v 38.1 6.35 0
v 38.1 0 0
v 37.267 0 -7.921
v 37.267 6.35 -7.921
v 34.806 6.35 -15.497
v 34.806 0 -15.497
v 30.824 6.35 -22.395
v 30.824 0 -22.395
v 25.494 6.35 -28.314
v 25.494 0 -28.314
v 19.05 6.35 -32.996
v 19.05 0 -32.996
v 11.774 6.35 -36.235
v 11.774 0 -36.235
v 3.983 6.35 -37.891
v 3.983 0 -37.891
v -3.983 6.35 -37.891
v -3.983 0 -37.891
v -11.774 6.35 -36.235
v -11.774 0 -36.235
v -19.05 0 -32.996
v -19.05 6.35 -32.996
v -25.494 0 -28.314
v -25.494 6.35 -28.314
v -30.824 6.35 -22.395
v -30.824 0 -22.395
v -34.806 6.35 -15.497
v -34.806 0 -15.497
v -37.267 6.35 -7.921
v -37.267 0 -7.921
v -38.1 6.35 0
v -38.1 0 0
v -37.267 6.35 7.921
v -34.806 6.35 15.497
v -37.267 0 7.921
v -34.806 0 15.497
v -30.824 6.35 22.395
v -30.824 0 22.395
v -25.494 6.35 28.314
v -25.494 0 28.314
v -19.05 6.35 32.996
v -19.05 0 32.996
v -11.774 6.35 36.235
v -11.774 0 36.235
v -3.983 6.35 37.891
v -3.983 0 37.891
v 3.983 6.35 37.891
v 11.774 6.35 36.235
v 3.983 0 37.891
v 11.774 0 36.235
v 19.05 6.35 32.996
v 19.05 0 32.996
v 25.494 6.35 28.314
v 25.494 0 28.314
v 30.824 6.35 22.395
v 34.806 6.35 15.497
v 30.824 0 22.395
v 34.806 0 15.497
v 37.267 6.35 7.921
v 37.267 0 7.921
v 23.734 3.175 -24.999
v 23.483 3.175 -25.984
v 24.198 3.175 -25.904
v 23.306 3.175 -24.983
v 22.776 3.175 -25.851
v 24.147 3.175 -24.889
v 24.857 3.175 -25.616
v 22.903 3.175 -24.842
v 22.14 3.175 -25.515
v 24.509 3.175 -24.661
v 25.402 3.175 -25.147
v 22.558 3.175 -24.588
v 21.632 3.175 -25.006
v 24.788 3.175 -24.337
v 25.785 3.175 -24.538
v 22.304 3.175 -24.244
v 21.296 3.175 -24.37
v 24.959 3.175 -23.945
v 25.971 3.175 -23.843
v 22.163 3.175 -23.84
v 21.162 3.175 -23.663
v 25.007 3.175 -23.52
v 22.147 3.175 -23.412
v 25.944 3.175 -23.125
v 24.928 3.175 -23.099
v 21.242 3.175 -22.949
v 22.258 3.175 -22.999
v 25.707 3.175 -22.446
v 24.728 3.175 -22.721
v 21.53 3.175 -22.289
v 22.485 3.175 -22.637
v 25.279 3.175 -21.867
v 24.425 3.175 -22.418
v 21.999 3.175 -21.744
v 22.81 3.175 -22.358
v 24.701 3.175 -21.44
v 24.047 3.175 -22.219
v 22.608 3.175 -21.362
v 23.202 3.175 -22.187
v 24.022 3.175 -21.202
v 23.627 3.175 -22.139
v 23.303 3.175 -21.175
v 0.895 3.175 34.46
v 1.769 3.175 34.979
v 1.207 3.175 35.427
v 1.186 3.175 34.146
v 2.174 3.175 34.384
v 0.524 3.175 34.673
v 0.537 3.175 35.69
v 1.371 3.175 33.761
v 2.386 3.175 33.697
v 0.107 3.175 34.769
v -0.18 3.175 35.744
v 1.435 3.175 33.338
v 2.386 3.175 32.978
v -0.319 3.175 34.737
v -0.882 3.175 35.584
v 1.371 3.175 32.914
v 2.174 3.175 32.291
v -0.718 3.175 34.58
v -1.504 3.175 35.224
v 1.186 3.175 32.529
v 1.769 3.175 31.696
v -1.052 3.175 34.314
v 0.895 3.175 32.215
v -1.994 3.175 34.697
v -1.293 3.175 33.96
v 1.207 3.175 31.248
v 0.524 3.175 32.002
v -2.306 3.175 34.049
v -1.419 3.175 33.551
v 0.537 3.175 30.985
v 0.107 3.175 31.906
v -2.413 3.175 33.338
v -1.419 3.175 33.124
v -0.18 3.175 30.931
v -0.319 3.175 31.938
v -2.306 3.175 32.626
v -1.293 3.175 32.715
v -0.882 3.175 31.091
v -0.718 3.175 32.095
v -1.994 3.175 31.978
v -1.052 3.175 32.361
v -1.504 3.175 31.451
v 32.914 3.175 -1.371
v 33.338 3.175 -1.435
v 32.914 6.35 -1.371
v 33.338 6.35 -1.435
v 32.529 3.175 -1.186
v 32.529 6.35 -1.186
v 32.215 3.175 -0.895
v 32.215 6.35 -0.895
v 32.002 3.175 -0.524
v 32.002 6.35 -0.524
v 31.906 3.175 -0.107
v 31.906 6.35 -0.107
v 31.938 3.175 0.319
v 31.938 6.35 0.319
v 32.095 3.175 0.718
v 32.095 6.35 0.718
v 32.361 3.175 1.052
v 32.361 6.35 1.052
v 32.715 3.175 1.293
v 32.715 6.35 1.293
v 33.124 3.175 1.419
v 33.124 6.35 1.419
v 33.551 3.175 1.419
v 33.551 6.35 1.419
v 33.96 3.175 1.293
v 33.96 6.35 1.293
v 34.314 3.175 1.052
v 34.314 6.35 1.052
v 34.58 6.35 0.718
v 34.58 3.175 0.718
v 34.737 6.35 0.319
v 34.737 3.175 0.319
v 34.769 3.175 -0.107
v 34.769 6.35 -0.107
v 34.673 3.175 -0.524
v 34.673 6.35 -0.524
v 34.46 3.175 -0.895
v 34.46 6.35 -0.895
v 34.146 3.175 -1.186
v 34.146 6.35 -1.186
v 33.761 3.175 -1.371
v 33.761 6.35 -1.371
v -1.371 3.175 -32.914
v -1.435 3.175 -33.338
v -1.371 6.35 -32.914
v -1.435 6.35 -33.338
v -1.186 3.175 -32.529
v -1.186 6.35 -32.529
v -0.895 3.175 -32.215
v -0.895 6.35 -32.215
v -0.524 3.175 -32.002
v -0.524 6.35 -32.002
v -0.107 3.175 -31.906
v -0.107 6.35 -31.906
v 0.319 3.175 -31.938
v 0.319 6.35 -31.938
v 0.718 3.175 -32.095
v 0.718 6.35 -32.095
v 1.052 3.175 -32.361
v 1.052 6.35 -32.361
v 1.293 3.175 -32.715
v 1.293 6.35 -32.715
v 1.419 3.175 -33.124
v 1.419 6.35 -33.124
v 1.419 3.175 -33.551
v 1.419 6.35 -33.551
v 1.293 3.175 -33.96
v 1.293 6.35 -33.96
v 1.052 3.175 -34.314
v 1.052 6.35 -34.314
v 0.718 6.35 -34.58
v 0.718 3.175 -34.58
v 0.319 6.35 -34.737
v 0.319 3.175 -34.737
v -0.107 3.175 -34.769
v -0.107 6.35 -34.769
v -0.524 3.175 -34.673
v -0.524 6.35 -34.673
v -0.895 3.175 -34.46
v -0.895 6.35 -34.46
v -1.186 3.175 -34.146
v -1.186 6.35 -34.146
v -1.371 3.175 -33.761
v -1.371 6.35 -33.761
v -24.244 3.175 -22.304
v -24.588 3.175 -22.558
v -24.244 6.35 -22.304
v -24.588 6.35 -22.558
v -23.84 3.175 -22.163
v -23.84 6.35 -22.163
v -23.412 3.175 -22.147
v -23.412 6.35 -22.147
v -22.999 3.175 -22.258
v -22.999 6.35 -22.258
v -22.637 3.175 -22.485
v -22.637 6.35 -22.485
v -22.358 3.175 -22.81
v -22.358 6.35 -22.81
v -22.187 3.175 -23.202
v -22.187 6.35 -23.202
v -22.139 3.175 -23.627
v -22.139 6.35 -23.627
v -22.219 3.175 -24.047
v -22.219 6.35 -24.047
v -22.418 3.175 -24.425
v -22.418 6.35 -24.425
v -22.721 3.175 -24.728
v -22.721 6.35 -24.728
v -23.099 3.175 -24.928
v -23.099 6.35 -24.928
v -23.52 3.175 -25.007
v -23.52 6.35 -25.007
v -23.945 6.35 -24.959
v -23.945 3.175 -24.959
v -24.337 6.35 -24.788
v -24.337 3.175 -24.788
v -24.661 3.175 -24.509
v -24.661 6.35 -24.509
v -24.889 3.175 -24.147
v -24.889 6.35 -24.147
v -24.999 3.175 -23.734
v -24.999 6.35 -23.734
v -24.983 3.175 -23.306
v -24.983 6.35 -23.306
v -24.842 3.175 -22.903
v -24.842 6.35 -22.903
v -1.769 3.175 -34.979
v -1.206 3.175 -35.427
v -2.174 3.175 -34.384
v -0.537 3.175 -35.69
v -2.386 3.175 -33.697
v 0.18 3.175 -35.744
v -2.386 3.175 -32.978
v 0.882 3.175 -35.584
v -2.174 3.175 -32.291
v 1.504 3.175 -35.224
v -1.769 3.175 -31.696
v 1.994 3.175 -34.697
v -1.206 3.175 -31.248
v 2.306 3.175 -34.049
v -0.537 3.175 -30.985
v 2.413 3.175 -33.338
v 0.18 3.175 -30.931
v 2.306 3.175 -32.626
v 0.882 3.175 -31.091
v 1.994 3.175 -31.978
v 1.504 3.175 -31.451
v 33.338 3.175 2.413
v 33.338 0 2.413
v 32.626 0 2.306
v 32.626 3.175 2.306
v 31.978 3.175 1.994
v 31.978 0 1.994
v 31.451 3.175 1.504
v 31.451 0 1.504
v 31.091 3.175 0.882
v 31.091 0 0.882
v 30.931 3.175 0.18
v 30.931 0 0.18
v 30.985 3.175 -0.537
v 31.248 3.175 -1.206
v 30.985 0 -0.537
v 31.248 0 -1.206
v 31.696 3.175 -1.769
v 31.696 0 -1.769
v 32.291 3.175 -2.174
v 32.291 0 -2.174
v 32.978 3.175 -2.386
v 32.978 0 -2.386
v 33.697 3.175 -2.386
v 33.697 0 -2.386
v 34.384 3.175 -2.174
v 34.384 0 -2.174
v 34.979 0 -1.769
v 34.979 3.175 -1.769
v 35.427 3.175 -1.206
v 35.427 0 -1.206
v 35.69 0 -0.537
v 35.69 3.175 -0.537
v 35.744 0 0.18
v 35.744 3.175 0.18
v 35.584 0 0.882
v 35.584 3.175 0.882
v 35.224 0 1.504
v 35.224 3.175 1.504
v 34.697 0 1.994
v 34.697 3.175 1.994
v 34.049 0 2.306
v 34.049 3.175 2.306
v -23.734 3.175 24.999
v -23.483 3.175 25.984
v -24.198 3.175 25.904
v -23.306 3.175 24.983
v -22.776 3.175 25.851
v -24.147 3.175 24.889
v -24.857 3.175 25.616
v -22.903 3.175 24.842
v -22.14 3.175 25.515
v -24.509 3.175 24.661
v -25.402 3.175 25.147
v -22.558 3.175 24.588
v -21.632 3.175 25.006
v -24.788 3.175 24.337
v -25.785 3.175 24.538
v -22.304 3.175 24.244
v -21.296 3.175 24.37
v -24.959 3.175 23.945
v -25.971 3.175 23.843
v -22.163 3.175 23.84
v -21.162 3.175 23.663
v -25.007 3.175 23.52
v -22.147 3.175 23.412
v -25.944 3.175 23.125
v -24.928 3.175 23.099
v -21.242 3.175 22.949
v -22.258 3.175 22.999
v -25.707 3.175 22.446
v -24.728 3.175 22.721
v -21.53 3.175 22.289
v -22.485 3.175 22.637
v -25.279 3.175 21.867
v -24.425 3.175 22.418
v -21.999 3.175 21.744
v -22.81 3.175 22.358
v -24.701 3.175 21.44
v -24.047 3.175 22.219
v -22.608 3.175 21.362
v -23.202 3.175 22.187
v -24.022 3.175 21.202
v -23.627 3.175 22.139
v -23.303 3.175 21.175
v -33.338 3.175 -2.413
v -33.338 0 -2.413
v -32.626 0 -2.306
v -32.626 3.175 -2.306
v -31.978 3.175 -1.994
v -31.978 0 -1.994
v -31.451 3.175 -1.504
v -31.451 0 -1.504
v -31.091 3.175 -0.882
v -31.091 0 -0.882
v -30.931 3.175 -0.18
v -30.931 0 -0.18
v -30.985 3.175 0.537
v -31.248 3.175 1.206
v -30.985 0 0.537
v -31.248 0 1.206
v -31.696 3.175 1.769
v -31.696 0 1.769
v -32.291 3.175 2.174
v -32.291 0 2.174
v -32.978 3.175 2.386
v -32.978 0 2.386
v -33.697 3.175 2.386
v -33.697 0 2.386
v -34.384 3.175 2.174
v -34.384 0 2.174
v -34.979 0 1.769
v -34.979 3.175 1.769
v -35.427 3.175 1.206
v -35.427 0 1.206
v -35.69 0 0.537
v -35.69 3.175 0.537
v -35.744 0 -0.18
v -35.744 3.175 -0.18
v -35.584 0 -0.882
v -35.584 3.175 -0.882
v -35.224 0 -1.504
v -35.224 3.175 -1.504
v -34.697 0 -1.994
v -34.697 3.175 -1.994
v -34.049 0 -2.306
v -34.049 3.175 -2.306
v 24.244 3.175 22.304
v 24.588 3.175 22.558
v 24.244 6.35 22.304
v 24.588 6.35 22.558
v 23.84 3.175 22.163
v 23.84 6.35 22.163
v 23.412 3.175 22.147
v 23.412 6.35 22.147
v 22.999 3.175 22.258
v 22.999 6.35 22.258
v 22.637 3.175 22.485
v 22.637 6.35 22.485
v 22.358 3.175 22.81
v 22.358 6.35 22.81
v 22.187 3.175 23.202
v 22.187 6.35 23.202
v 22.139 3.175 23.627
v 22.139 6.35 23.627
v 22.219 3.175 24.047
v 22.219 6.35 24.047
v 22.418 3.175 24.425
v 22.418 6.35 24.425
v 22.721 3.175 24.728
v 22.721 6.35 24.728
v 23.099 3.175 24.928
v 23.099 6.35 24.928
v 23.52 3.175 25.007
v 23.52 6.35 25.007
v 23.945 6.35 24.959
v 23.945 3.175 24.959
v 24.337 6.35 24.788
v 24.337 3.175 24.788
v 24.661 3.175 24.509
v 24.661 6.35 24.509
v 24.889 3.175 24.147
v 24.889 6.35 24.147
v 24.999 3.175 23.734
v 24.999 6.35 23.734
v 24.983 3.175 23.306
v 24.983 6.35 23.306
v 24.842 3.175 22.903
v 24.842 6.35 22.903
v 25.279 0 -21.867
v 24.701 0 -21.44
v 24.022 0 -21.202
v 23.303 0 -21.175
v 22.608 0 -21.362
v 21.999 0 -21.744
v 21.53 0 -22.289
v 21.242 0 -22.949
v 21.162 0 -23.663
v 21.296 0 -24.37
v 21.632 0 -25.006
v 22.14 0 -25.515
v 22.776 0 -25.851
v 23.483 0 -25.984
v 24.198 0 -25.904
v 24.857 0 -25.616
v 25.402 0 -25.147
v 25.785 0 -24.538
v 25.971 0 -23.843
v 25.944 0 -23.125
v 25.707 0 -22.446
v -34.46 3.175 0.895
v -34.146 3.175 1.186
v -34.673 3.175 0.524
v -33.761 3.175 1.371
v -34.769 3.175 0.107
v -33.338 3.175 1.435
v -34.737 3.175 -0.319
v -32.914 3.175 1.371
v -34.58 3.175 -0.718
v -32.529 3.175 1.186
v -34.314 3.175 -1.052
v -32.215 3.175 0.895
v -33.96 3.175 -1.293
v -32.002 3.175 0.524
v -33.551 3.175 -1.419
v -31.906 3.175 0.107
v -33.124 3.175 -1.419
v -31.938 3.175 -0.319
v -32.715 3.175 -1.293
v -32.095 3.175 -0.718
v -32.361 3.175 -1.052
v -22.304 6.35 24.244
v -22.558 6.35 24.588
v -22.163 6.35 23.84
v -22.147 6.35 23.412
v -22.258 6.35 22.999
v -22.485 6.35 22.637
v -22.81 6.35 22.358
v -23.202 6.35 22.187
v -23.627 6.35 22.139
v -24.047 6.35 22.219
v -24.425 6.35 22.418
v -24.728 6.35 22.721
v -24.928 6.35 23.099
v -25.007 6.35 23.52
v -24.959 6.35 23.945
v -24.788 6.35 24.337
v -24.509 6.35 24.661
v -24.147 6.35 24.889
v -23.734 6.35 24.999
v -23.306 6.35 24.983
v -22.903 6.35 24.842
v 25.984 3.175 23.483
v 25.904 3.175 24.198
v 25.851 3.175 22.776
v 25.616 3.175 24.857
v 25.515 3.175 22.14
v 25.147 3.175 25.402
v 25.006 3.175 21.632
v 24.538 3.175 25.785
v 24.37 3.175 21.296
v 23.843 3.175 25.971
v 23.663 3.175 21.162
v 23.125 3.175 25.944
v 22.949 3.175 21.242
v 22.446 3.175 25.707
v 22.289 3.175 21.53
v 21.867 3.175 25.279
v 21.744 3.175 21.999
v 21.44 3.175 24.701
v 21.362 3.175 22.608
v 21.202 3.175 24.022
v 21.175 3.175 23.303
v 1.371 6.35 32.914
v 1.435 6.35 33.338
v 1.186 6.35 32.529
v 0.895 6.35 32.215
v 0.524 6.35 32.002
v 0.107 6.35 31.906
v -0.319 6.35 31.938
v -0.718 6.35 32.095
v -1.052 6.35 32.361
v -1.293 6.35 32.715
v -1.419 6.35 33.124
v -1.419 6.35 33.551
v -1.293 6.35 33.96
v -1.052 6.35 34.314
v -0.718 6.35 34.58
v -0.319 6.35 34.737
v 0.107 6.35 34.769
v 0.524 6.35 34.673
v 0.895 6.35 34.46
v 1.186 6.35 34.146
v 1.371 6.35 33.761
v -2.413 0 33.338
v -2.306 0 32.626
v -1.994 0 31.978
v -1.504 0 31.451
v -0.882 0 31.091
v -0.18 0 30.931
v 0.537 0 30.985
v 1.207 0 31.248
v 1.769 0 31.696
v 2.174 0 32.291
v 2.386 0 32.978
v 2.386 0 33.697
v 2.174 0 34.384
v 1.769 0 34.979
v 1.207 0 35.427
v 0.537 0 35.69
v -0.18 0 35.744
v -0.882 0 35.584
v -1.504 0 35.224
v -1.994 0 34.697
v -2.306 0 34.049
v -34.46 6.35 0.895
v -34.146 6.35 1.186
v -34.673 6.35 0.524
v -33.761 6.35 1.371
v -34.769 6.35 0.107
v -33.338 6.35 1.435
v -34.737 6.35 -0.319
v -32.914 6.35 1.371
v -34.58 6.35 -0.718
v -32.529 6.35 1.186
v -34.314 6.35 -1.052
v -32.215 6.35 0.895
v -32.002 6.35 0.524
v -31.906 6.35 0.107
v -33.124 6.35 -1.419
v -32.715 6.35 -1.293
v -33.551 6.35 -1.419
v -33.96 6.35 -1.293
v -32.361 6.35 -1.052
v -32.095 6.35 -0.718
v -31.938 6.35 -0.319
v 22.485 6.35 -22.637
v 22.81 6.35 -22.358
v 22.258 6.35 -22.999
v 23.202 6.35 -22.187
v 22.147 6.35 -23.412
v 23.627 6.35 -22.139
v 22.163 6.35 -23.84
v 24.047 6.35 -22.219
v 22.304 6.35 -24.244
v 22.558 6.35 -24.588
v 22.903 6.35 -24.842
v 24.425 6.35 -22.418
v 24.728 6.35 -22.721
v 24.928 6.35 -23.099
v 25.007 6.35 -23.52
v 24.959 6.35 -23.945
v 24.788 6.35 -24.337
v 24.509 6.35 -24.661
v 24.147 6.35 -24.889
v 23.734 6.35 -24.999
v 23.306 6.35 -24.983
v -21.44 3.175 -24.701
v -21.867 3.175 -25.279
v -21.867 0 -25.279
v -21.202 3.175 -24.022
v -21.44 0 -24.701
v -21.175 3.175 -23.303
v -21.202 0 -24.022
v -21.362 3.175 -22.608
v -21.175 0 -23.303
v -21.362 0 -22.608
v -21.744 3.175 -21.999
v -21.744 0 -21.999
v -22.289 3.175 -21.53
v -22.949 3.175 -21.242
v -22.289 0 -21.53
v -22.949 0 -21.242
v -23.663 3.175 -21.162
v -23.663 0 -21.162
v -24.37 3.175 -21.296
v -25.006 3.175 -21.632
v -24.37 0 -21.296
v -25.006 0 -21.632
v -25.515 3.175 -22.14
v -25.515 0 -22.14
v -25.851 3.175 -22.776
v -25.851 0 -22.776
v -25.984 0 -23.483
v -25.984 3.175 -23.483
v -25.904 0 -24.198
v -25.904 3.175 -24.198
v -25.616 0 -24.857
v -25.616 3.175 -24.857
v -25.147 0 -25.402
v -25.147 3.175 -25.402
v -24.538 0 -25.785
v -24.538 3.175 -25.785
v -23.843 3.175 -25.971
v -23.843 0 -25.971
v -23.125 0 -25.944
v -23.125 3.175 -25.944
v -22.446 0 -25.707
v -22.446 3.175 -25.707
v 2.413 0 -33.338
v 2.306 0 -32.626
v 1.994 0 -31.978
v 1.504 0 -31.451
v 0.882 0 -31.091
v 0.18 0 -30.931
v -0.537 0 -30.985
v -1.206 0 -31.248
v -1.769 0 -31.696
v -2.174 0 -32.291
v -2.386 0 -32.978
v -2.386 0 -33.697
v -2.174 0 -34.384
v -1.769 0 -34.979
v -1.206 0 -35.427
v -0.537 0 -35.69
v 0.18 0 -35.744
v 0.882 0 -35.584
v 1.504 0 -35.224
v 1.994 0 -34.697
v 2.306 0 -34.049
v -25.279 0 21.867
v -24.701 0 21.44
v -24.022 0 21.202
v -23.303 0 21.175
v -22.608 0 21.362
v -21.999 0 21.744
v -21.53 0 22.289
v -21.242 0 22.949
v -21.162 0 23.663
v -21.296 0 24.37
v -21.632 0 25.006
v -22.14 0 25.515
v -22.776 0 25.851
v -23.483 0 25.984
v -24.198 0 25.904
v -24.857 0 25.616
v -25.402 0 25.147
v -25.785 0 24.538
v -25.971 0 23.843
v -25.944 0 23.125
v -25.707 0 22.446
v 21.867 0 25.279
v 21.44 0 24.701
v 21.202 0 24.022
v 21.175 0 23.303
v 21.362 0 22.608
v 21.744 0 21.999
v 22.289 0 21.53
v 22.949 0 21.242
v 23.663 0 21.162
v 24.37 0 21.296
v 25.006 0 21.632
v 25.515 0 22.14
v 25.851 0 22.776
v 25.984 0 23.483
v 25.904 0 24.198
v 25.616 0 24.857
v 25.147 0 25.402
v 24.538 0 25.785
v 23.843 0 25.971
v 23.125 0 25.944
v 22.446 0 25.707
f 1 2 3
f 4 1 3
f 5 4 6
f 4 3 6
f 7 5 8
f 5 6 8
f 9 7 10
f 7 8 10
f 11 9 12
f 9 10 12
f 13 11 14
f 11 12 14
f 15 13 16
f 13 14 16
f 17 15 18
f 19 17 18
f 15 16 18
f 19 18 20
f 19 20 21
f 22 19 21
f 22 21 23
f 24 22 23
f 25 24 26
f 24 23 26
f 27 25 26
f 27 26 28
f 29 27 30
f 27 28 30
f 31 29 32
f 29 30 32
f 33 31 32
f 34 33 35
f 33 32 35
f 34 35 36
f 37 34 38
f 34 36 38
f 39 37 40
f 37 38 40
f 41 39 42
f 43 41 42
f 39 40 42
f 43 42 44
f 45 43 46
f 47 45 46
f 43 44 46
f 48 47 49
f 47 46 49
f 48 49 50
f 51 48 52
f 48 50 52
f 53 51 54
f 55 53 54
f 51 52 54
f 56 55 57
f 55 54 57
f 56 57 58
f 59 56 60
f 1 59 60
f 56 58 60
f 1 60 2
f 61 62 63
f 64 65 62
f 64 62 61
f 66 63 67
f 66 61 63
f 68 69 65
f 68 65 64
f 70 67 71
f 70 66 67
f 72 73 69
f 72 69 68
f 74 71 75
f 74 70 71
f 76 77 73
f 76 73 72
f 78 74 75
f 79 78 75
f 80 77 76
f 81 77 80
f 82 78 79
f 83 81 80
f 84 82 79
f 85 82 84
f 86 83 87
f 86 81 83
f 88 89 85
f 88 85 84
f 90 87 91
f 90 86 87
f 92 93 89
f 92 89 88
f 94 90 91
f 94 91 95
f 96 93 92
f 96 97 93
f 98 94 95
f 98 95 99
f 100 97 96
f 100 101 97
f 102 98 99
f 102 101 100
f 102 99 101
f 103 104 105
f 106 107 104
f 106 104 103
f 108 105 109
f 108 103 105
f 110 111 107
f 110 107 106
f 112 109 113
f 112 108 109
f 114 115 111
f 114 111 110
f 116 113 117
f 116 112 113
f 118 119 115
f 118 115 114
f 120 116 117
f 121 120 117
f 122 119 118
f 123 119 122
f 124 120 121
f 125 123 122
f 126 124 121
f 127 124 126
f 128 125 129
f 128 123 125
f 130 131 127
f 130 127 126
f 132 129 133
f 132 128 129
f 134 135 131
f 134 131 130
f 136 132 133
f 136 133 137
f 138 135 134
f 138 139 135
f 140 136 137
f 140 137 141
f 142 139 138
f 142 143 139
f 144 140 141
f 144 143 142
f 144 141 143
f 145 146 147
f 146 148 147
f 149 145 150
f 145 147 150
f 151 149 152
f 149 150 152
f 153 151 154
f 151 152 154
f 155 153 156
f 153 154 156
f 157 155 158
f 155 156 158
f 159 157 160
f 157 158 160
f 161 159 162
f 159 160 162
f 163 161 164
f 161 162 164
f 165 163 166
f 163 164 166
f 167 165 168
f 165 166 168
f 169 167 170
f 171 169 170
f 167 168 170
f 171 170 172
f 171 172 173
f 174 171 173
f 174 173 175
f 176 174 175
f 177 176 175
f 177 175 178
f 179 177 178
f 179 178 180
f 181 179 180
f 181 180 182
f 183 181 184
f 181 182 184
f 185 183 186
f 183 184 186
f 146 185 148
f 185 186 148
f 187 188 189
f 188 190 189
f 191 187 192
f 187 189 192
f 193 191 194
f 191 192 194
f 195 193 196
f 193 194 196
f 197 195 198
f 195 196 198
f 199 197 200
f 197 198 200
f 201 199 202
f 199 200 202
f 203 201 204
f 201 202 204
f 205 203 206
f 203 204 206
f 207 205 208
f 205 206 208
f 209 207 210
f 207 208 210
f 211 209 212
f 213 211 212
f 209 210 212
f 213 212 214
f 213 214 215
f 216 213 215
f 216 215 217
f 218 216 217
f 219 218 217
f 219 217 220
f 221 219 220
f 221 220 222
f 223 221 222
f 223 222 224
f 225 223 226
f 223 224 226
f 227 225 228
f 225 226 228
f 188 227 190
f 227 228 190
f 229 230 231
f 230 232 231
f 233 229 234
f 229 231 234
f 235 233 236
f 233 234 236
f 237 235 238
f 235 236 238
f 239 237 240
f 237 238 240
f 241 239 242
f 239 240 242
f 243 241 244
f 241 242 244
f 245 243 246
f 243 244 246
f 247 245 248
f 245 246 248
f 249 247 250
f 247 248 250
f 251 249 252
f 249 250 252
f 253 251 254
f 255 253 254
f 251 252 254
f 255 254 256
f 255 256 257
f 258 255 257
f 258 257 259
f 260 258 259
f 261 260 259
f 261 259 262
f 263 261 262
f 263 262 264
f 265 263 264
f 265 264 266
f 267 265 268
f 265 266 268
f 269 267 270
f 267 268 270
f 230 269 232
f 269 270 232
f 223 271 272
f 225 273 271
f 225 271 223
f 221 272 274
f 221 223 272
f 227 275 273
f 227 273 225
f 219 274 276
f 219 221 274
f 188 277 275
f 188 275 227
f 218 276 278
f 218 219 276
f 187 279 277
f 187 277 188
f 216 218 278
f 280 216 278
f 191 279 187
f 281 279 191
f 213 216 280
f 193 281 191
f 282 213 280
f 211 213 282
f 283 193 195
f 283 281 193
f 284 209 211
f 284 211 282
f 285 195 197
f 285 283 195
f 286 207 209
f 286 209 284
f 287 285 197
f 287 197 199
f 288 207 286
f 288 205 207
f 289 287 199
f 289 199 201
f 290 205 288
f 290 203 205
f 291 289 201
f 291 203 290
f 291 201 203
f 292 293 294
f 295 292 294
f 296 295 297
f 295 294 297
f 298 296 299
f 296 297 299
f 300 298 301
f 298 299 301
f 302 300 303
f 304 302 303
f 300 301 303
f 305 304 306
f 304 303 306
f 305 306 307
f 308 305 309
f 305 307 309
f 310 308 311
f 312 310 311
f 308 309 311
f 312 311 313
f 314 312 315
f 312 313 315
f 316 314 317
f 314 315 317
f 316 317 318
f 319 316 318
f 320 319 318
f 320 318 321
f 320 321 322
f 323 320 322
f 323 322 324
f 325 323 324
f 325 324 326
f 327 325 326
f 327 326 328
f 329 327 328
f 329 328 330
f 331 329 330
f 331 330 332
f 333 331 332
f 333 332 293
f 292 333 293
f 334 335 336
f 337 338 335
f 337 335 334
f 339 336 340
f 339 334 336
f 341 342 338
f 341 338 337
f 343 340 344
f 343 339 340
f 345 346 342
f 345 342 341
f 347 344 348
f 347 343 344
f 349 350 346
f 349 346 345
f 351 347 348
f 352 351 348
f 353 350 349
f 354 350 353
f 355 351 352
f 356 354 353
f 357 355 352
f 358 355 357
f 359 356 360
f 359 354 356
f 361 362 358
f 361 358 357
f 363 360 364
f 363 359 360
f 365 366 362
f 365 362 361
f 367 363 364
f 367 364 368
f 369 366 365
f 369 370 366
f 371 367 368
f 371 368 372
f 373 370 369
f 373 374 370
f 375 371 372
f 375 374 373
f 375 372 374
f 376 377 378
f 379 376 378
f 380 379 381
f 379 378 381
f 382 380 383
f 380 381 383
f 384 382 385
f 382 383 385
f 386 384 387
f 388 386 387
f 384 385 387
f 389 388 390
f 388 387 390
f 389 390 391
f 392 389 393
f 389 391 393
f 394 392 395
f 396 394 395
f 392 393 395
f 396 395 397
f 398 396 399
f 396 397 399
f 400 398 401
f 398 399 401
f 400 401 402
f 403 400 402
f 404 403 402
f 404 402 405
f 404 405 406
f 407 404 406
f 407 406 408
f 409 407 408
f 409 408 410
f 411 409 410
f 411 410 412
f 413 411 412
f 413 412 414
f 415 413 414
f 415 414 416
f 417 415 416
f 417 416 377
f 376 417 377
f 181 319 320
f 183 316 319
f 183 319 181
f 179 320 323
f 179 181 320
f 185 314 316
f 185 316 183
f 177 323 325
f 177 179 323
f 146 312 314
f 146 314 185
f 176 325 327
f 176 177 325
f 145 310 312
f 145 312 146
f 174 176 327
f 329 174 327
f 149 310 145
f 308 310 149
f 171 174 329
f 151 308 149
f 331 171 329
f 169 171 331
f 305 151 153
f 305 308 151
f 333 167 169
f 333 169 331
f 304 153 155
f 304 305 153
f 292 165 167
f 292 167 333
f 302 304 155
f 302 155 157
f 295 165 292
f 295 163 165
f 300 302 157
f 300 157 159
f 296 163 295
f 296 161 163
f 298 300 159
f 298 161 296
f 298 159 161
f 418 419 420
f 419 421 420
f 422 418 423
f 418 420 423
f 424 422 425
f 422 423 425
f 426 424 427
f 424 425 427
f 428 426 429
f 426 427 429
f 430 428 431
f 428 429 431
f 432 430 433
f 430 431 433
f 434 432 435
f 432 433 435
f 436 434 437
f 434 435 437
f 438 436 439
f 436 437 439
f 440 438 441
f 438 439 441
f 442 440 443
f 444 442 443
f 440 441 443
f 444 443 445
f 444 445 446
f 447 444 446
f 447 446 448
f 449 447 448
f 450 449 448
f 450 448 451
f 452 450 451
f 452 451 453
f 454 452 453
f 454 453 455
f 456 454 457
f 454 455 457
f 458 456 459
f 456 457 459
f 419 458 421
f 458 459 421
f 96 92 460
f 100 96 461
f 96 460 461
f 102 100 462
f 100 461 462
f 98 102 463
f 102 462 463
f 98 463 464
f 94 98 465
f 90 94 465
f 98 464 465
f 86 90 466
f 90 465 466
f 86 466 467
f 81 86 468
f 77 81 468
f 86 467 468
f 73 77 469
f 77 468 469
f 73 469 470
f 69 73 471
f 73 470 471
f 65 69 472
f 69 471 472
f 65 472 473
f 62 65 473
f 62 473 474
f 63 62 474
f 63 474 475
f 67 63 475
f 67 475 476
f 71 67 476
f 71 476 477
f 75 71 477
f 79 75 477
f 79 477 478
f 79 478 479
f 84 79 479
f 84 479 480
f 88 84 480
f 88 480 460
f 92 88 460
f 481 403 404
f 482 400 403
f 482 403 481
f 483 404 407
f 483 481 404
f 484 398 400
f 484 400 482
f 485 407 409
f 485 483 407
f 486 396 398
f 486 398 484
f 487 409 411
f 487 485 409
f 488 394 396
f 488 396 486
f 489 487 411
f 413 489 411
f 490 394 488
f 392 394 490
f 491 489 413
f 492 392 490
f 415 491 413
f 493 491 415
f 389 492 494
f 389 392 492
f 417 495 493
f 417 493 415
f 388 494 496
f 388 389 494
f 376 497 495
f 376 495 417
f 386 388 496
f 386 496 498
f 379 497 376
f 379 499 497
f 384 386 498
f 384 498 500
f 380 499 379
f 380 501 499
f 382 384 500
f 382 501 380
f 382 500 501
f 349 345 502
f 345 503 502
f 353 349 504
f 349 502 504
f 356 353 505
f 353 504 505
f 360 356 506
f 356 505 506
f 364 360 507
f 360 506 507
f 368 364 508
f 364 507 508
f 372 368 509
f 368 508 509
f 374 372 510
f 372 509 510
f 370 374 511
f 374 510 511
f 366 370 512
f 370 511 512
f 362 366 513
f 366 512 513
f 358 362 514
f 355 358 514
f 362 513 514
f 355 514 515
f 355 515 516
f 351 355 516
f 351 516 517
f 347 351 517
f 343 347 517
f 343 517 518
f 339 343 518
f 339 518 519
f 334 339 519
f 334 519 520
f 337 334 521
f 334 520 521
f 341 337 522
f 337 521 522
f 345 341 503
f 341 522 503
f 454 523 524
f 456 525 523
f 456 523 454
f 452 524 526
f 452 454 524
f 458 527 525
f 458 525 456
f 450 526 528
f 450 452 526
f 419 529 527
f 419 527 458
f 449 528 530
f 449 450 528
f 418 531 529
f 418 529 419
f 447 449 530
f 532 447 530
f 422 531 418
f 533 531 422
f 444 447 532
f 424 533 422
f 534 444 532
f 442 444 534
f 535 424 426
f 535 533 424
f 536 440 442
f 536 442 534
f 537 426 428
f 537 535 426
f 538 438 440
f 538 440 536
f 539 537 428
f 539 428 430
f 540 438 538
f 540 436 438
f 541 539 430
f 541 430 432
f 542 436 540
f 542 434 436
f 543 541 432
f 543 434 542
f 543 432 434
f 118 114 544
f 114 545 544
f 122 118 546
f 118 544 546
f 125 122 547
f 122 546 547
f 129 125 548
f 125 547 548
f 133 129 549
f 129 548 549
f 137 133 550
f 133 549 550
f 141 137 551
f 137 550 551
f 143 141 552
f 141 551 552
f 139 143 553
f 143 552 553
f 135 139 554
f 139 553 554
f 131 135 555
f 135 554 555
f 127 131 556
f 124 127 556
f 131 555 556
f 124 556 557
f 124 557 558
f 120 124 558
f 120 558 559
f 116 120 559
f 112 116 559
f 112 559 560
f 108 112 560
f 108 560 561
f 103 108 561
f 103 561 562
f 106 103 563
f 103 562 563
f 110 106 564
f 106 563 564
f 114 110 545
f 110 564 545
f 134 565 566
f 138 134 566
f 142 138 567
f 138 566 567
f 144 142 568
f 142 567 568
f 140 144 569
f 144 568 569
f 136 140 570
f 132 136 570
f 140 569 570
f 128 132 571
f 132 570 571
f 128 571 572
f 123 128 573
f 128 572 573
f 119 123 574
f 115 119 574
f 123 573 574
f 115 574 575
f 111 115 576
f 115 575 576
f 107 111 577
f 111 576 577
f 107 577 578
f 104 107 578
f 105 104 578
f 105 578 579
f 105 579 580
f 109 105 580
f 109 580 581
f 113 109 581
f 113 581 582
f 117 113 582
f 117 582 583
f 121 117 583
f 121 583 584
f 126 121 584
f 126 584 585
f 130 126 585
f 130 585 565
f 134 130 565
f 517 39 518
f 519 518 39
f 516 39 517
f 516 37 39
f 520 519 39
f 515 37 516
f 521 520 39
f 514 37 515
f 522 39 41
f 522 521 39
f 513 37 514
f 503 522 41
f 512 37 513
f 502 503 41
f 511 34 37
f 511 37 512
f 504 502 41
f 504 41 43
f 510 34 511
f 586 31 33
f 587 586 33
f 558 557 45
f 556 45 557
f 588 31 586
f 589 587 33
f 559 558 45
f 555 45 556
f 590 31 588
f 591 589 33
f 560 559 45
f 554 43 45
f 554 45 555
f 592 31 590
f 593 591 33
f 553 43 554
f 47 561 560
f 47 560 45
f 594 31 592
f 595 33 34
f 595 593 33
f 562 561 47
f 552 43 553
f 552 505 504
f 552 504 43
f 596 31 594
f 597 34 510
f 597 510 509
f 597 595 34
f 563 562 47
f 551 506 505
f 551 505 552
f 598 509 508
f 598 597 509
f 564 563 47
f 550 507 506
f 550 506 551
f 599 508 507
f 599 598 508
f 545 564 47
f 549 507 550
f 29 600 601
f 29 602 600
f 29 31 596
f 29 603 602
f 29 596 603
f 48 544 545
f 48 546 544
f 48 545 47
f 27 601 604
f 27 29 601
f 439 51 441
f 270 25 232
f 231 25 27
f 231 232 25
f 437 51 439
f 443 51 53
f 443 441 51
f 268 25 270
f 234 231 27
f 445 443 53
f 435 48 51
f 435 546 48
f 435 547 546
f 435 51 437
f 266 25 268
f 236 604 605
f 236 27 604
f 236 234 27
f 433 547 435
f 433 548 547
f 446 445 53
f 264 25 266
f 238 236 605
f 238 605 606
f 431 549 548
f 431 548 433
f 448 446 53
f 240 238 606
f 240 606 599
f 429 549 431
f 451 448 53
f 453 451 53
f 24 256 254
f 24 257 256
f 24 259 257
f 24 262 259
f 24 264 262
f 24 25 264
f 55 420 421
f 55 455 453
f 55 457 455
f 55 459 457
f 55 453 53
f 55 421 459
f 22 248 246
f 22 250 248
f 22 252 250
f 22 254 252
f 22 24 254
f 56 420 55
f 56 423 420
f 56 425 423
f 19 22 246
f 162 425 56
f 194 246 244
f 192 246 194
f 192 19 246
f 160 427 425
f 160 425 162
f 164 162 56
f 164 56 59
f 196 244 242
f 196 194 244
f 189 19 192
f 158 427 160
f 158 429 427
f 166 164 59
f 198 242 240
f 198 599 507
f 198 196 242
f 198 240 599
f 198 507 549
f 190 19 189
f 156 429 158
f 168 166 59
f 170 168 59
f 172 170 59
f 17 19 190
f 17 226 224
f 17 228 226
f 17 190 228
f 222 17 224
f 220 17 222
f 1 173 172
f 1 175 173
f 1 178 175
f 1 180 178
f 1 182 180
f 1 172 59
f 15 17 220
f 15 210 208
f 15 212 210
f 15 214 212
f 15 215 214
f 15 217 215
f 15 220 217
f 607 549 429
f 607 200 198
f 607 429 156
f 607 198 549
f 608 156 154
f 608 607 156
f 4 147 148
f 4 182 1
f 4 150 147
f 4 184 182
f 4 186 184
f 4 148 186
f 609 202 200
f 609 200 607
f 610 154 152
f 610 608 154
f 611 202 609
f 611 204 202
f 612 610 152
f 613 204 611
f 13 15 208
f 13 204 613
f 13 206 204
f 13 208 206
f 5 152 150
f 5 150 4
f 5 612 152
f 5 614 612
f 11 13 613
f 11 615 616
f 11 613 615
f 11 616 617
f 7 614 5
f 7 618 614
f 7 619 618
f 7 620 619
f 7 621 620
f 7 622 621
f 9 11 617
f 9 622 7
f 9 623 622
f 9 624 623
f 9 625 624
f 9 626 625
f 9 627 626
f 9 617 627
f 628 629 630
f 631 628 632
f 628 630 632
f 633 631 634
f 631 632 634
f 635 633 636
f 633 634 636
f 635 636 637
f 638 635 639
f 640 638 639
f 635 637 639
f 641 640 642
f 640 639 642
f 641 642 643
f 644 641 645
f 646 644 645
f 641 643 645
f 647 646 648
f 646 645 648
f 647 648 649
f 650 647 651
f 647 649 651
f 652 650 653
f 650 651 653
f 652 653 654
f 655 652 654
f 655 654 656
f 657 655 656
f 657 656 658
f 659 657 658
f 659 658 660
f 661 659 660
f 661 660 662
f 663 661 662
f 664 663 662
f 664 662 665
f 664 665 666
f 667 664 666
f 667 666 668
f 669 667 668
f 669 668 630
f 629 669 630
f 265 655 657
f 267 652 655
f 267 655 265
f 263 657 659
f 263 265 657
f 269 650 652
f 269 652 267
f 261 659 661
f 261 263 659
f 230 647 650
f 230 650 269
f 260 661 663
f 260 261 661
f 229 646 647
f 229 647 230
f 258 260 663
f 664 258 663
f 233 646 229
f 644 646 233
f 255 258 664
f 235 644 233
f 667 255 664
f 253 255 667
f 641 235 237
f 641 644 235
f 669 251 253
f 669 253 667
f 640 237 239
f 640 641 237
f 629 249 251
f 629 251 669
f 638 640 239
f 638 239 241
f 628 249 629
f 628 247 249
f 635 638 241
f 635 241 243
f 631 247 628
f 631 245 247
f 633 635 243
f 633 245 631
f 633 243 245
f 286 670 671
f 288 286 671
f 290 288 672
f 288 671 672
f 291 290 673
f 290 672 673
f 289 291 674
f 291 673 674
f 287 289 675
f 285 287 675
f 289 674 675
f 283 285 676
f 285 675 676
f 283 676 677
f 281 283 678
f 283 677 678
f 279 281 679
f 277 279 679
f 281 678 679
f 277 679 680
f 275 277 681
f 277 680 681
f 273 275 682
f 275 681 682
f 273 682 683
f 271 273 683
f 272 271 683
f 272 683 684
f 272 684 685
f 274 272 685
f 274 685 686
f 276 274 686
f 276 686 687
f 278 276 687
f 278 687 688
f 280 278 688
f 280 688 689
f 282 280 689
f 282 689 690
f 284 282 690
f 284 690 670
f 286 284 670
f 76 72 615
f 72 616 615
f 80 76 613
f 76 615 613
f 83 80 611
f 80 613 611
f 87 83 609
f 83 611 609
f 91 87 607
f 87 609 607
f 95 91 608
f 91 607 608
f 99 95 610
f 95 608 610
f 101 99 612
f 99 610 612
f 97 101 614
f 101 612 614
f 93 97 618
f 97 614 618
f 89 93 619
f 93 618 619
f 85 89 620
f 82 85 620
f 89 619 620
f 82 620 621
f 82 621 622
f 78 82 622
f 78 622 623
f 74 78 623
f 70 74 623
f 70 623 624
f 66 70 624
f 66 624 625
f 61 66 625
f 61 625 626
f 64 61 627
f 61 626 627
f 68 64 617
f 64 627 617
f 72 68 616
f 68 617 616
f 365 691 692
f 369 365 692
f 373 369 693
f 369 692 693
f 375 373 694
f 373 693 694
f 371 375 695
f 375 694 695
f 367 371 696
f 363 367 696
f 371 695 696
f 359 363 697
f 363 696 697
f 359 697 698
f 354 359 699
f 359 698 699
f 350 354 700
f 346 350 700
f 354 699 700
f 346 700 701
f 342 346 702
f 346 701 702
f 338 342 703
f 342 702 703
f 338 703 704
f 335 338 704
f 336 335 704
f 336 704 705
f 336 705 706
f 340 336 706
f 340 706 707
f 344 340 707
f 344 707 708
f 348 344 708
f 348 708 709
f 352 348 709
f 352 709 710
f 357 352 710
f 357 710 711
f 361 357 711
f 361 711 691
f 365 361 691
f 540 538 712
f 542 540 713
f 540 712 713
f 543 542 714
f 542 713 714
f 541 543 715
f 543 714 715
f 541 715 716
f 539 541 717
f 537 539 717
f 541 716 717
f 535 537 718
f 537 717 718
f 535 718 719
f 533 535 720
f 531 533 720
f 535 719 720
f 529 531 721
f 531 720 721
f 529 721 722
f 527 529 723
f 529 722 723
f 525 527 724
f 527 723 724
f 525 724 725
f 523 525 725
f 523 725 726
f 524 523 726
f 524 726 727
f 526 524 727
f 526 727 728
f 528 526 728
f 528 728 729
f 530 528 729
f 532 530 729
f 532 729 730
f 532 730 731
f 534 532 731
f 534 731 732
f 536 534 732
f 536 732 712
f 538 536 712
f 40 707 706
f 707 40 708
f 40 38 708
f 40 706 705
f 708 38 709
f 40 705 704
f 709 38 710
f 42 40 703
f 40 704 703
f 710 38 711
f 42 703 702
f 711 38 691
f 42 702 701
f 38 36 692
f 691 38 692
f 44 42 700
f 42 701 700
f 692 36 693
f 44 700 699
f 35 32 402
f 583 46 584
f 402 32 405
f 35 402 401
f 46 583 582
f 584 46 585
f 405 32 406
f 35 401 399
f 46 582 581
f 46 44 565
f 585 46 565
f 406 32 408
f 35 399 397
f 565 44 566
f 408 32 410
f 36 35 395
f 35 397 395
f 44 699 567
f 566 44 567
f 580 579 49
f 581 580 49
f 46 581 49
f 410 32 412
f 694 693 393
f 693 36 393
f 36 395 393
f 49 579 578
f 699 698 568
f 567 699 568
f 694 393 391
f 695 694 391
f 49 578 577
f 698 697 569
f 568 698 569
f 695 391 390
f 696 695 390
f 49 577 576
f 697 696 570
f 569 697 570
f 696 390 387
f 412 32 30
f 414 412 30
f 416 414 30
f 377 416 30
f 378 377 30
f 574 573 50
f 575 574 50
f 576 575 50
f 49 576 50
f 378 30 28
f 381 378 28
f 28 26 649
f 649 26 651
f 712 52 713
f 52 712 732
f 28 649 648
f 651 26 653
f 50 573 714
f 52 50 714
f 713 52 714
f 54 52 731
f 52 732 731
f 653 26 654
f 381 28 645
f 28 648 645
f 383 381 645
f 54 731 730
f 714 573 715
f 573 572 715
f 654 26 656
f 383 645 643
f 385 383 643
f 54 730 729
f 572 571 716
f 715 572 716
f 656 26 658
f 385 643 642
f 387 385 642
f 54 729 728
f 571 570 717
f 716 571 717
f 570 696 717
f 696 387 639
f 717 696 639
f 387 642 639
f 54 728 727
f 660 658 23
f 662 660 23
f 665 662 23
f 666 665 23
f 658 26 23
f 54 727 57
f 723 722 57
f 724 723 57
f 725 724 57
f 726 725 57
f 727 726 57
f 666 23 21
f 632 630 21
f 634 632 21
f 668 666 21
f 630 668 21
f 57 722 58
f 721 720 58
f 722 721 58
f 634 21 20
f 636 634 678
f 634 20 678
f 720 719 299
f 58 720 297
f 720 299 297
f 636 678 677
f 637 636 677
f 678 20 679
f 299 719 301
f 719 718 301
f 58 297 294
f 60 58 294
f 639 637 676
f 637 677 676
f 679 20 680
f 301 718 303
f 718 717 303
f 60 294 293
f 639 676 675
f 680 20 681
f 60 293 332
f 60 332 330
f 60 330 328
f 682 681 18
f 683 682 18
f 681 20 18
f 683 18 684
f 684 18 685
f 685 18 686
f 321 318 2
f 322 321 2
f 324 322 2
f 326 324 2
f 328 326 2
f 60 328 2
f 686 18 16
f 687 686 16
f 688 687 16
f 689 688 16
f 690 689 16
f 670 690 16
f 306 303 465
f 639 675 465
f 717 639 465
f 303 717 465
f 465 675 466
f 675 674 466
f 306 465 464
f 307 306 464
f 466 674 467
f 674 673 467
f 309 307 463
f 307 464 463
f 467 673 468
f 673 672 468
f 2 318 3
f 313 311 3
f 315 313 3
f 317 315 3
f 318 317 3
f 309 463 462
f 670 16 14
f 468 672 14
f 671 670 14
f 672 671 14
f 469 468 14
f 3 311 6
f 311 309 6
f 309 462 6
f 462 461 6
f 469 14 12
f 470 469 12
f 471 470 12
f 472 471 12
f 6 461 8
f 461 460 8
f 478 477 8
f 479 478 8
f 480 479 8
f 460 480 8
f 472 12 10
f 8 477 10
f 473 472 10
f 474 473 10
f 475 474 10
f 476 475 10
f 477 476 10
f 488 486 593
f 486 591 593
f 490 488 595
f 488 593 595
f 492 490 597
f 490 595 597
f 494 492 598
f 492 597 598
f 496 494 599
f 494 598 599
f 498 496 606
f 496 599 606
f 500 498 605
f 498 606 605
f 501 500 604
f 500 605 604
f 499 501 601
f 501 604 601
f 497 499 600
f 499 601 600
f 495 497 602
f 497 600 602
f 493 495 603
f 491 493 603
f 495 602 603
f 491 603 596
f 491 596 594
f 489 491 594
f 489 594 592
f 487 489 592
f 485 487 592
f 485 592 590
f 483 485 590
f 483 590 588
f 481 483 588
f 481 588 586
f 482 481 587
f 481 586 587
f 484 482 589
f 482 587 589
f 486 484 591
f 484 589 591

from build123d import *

# Parameters (mm, degrees)
SKETCH1_R                                      = 38.1
BOSS_EXTRUDE1_DEPTH                            = 6.35
CBORE_FOR_4_BUTTON_HEAD_CAP_SCREW1_D           = 2.8702
CBORE_FOR_4_BUTTON_HEAD_CAP_SCREW1_CBORE_D     = 4.826
CBORE_FOR_4_BUTTON_HEAD_CAP_SCREW1_CBORE_DEPTH = 3.175
CIRPATTERN1_COUNT                              = 8


with BuildPart() as part:
    # Sketch1 → Boss-Extrude1 (new body)
    with BuildSketch(Plane(origin=(0, 0, 0), x_dir=(1, 0, 0), z_dir=(0, 1, 0))):
        Circle(SKETCH1_R)
    extrude(amount=BOSS_EXTRUDE1_DEPTH)

    # CBORE for #4 Button Head Cap Screw1 (through all)
    with Locations(Plane(origin=(0, 0, 0), x_dir=(-1, 0, 0), z_dir=(0, -1, 0))):
        with Locations((0, -33.3375)):
            cbore_for_4_button_head_cap_screw1 = CounterBoreHole(CBORE_FOR_4_BUTTON_HEAD_CAP_SCREW1_D / 2, CBORE_FOR_4_BUTTON_HEAD_CAP_SCREW1_CBORE_D / 2, CBORE_FOR_4_BUTTON_HEAD_CAP_SCREW1_CBORE_DEPTH)

    # CirPattern1: CBORE for #4 Button Head Cap Screw1 ×8 about axis
    cirpattern1_axis = Axis((0, 0, 0), (0, 1, 0))
    for i in range(1, CIRPATTERN1_COUNT):
        add(cbore_for_4_button_head_cap_screw1.rotate(cirpattern1_axis, i * 360 / CIRPATTERN1_COUNT), mode=Mode.SUBTRACT)


solid = part.part
